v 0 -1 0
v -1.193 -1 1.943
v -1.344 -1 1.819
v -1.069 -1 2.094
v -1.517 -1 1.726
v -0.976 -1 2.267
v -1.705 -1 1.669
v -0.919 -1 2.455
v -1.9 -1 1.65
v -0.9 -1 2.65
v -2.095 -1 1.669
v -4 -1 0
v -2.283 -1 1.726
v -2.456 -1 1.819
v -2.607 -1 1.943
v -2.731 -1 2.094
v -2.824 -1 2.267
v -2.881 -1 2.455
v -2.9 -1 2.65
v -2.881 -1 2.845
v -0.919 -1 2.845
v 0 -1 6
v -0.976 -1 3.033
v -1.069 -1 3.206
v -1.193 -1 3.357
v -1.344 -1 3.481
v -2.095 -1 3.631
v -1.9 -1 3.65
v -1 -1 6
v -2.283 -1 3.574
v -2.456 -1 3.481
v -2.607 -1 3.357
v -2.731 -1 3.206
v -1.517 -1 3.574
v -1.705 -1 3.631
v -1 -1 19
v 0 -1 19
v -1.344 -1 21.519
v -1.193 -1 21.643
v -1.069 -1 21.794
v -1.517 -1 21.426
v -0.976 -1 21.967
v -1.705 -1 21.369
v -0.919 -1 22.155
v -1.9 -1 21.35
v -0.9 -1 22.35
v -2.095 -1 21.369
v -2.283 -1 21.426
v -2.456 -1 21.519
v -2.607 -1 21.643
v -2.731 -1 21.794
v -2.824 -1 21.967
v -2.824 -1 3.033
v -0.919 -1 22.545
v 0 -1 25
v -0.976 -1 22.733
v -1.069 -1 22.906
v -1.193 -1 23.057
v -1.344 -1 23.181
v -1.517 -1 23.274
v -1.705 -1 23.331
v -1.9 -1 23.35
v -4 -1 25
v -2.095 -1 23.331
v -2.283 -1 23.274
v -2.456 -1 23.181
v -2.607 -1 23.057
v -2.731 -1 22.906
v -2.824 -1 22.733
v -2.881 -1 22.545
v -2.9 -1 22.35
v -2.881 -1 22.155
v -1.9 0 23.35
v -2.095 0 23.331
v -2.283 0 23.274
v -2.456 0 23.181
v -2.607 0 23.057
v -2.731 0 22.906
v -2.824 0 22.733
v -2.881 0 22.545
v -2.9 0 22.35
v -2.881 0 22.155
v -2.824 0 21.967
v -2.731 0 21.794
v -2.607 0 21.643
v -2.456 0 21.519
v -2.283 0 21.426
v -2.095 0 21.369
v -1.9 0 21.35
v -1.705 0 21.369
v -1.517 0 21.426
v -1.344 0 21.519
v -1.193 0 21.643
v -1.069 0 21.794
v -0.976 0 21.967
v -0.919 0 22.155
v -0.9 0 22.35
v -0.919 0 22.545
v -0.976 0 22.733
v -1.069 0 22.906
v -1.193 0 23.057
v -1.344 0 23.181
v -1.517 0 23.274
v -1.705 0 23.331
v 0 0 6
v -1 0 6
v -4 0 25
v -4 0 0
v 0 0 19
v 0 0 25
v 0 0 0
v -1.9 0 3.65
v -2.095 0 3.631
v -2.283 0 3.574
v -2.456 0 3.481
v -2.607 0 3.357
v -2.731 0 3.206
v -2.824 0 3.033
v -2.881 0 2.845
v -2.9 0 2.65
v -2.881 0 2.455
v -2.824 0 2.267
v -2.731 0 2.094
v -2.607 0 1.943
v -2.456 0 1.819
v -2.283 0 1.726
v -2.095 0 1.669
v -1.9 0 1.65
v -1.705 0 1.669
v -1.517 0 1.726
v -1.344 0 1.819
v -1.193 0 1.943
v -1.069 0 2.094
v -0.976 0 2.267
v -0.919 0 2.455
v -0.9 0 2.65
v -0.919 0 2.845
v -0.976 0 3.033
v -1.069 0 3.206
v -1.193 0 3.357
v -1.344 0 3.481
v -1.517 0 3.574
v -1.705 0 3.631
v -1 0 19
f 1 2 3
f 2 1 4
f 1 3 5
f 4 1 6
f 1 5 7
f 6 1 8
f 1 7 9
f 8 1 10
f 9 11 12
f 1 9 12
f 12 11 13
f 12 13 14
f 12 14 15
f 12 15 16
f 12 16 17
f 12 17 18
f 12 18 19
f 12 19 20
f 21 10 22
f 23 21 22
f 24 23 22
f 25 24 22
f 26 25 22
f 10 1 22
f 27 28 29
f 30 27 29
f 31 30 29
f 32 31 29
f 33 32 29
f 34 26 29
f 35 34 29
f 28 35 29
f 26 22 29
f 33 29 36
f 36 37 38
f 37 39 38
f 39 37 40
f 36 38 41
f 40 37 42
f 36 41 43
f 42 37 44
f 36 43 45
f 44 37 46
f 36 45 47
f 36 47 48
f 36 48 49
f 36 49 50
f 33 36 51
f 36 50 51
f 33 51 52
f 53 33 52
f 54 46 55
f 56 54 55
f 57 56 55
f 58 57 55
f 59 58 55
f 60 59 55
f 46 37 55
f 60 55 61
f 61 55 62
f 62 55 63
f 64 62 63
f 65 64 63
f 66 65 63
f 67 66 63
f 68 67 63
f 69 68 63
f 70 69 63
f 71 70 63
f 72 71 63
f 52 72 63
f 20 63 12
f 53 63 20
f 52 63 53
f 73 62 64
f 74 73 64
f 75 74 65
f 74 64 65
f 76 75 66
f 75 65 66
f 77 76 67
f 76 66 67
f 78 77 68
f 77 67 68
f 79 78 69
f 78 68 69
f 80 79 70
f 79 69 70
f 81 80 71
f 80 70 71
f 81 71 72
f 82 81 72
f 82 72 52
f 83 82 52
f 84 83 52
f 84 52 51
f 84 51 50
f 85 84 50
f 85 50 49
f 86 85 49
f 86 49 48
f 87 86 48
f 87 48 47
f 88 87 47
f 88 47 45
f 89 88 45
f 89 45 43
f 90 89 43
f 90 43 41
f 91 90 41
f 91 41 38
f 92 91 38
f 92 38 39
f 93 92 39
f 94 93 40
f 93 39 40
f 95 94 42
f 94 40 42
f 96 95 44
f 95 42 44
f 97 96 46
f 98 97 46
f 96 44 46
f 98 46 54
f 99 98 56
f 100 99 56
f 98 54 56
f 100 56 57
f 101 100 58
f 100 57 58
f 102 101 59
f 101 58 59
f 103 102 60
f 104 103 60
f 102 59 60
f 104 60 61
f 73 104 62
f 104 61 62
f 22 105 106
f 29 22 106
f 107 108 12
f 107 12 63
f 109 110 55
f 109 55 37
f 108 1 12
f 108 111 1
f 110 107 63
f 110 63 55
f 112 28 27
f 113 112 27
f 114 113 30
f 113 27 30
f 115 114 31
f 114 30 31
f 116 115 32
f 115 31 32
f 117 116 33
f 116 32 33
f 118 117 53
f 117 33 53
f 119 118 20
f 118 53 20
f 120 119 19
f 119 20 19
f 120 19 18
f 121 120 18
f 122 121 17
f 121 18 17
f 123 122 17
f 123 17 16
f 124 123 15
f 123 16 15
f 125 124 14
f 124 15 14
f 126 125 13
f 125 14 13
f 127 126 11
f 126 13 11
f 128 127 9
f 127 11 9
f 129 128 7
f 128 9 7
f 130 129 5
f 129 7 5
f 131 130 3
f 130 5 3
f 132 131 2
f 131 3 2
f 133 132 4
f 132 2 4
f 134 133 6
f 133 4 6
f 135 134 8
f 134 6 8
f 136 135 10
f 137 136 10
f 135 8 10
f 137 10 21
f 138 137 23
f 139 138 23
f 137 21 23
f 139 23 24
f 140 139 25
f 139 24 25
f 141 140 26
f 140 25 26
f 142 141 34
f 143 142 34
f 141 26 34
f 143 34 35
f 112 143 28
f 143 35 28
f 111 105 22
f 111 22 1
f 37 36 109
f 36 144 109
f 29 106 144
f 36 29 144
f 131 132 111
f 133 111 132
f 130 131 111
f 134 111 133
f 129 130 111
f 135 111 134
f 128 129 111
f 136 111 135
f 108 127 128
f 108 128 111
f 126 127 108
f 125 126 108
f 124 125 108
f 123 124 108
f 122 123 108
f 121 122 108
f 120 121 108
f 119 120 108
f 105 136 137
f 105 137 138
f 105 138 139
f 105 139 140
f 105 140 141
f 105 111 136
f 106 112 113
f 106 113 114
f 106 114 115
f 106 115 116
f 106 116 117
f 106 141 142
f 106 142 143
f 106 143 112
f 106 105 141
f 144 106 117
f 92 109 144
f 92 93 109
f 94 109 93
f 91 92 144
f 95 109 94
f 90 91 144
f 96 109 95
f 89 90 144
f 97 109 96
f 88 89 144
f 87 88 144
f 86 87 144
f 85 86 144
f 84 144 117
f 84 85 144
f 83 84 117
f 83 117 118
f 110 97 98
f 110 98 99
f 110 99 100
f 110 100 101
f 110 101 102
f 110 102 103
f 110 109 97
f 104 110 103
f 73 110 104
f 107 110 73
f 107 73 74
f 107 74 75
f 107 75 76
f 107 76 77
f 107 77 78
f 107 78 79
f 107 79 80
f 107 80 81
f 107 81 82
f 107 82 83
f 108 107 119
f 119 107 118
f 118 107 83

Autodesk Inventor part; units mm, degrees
ref_plane "YZ Plane" through (0, 0, 0) normal (1, 0, 0) x (0, 1, 0)
ref_plane "XZ Plane" through (0, 0, 0) normal (0, 1, 0) x (-1, 0, 0)
ref_plane "XY Plane" through (0, 0, 0) normal (0, 0, 1) x (1, 0, 0)
sketch "Sketch1" plane through (0, 0, 0) normal (0, 1, 0) x (-1, 0, 0)
  point P0 (0, 0)
sketch "Sketch2" plane through (0, 0, 0) normal (0, 1, 0) x (-1, 0, 0)
  line L0 (0, 0) -> (4, 0)
  line L1 (4, 0) -> (4, 25)
  line L2 (4, 25) -> (0, 25)
  line L3 (0, 25) -> (0, 0)
  point P0 (3, 0)
  point P1 (0, 6)
  point P2 (0, 19)
  dimension "d0" = 4
  dimension "d1" = 25
extrude "Extrusion1" add sketch "Sketch2" against normal blind 1
sketch "Sketch3" plane through (0, 0, 0) normal (0, 1, 0) x (-1, 0, 0)
  line L0 (1, 19) -> (0, 19)
  line L1 (0, 19) -> (0, 6)
  line L2 (0, 6) -> (1, 6)
  line L3 (1, 6) -> (1, 19)
  point P0 (0, 0)
  point P1 (0, 2.65)
  point P2 (0, 0)
  point P3 (0, 22.35)
  point P4 (-6.35, -25.4)
  point P5 (3, 25)
  point P6 (3, 22.35)
  point P7 (3, 2.65)
  dimension "d4" = 13
  dimension "d20" = 1
extrude "Extrusion2" cut sketch "Sketch3" against normal blind 1
sketch "Sketch6" plane through (0, 0, 0) normal (0, 1, 0) x (1, 0, 0)
  point P0 (0, 0)
sketch "Sketch7" plane through (0, 0, 0) normal (0, 1, 0) x (1, 0, 0)
  line L0 (-4, 0) -> (-4, -25) projected
  line L1 (-4, -25) -> (0, -25) projected
  point P0 (0, 0)
  point P1 (-1.9, -2.65)
  point P2 (-1.9, -22.35)
  dimension "d21" = 2.1
  dimension "d22" = 2.65
  dimension "d23" = 2.65
  dimension "d24" = 2.1
hole "Hole2" at (-1.9, 0, 2.65) at (-1.9, 0, 22.35) direction (0, -1, 0) diameter 2 depth 2 tip angle 118
properties part number "headplate_ephys"
